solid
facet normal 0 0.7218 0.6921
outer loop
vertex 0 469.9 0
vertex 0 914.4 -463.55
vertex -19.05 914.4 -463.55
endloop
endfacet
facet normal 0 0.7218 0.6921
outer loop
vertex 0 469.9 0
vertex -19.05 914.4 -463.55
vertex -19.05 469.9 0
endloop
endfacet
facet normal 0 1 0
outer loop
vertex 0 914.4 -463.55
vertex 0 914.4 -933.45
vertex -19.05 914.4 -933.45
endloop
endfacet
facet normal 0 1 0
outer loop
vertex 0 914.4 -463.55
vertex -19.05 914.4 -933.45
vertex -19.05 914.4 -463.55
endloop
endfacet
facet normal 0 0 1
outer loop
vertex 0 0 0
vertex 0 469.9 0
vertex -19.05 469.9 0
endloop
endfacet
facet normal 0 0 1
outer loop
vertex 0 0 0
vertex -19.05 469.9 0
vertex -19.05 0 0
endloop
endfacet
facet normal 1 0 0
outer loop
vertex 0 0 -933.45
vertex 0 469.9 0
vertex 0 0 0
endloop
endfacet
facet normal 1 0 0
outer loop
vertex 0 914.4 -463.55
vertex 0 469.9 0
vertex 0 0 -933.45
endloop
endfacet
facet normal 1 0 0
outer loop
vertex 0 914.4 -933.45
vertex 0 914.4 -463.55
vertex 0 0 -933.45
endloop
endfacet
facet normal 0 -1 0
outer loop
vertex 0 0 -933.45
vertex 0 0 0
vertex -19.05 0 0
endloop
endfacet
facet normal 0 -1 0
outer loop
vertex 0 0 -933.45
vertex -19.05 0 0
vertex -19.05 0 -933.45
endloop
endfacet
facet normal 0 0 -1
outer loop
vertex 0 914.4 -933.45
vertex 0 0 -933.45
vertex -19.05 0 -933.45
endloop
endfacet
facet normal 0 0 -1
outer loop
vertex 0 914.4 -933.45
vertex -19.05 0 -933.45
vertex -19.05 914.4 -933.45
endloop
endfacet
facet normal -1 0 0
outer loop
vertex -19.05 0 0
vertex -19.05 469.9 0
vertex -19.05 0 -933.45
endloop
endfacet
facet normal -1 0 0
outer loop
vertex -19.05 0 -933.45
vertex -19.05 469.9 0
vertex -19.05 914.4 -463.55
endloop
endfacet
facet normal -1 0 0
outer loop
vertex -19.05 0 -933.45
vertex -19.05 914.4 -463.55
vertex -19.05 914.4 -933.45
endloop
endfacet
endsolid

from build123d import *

# Parameters (mm, degrees)
BOSS_EXTRUDE1_DEPTH = 19.05


with BuildPart() as part:
    # Sketch2 → Boss-Extrude1 (new body)
    with BuildSketch(Plane.ZY):
        Polygon((0, 0), (-933.45, 0), (-933.45, 914.4), (-463.55, 914.4), (0, 469.9), align=None)
    extrude(amount=BOSS_EXTRUDE1_DEPTH)


solid = part.part
